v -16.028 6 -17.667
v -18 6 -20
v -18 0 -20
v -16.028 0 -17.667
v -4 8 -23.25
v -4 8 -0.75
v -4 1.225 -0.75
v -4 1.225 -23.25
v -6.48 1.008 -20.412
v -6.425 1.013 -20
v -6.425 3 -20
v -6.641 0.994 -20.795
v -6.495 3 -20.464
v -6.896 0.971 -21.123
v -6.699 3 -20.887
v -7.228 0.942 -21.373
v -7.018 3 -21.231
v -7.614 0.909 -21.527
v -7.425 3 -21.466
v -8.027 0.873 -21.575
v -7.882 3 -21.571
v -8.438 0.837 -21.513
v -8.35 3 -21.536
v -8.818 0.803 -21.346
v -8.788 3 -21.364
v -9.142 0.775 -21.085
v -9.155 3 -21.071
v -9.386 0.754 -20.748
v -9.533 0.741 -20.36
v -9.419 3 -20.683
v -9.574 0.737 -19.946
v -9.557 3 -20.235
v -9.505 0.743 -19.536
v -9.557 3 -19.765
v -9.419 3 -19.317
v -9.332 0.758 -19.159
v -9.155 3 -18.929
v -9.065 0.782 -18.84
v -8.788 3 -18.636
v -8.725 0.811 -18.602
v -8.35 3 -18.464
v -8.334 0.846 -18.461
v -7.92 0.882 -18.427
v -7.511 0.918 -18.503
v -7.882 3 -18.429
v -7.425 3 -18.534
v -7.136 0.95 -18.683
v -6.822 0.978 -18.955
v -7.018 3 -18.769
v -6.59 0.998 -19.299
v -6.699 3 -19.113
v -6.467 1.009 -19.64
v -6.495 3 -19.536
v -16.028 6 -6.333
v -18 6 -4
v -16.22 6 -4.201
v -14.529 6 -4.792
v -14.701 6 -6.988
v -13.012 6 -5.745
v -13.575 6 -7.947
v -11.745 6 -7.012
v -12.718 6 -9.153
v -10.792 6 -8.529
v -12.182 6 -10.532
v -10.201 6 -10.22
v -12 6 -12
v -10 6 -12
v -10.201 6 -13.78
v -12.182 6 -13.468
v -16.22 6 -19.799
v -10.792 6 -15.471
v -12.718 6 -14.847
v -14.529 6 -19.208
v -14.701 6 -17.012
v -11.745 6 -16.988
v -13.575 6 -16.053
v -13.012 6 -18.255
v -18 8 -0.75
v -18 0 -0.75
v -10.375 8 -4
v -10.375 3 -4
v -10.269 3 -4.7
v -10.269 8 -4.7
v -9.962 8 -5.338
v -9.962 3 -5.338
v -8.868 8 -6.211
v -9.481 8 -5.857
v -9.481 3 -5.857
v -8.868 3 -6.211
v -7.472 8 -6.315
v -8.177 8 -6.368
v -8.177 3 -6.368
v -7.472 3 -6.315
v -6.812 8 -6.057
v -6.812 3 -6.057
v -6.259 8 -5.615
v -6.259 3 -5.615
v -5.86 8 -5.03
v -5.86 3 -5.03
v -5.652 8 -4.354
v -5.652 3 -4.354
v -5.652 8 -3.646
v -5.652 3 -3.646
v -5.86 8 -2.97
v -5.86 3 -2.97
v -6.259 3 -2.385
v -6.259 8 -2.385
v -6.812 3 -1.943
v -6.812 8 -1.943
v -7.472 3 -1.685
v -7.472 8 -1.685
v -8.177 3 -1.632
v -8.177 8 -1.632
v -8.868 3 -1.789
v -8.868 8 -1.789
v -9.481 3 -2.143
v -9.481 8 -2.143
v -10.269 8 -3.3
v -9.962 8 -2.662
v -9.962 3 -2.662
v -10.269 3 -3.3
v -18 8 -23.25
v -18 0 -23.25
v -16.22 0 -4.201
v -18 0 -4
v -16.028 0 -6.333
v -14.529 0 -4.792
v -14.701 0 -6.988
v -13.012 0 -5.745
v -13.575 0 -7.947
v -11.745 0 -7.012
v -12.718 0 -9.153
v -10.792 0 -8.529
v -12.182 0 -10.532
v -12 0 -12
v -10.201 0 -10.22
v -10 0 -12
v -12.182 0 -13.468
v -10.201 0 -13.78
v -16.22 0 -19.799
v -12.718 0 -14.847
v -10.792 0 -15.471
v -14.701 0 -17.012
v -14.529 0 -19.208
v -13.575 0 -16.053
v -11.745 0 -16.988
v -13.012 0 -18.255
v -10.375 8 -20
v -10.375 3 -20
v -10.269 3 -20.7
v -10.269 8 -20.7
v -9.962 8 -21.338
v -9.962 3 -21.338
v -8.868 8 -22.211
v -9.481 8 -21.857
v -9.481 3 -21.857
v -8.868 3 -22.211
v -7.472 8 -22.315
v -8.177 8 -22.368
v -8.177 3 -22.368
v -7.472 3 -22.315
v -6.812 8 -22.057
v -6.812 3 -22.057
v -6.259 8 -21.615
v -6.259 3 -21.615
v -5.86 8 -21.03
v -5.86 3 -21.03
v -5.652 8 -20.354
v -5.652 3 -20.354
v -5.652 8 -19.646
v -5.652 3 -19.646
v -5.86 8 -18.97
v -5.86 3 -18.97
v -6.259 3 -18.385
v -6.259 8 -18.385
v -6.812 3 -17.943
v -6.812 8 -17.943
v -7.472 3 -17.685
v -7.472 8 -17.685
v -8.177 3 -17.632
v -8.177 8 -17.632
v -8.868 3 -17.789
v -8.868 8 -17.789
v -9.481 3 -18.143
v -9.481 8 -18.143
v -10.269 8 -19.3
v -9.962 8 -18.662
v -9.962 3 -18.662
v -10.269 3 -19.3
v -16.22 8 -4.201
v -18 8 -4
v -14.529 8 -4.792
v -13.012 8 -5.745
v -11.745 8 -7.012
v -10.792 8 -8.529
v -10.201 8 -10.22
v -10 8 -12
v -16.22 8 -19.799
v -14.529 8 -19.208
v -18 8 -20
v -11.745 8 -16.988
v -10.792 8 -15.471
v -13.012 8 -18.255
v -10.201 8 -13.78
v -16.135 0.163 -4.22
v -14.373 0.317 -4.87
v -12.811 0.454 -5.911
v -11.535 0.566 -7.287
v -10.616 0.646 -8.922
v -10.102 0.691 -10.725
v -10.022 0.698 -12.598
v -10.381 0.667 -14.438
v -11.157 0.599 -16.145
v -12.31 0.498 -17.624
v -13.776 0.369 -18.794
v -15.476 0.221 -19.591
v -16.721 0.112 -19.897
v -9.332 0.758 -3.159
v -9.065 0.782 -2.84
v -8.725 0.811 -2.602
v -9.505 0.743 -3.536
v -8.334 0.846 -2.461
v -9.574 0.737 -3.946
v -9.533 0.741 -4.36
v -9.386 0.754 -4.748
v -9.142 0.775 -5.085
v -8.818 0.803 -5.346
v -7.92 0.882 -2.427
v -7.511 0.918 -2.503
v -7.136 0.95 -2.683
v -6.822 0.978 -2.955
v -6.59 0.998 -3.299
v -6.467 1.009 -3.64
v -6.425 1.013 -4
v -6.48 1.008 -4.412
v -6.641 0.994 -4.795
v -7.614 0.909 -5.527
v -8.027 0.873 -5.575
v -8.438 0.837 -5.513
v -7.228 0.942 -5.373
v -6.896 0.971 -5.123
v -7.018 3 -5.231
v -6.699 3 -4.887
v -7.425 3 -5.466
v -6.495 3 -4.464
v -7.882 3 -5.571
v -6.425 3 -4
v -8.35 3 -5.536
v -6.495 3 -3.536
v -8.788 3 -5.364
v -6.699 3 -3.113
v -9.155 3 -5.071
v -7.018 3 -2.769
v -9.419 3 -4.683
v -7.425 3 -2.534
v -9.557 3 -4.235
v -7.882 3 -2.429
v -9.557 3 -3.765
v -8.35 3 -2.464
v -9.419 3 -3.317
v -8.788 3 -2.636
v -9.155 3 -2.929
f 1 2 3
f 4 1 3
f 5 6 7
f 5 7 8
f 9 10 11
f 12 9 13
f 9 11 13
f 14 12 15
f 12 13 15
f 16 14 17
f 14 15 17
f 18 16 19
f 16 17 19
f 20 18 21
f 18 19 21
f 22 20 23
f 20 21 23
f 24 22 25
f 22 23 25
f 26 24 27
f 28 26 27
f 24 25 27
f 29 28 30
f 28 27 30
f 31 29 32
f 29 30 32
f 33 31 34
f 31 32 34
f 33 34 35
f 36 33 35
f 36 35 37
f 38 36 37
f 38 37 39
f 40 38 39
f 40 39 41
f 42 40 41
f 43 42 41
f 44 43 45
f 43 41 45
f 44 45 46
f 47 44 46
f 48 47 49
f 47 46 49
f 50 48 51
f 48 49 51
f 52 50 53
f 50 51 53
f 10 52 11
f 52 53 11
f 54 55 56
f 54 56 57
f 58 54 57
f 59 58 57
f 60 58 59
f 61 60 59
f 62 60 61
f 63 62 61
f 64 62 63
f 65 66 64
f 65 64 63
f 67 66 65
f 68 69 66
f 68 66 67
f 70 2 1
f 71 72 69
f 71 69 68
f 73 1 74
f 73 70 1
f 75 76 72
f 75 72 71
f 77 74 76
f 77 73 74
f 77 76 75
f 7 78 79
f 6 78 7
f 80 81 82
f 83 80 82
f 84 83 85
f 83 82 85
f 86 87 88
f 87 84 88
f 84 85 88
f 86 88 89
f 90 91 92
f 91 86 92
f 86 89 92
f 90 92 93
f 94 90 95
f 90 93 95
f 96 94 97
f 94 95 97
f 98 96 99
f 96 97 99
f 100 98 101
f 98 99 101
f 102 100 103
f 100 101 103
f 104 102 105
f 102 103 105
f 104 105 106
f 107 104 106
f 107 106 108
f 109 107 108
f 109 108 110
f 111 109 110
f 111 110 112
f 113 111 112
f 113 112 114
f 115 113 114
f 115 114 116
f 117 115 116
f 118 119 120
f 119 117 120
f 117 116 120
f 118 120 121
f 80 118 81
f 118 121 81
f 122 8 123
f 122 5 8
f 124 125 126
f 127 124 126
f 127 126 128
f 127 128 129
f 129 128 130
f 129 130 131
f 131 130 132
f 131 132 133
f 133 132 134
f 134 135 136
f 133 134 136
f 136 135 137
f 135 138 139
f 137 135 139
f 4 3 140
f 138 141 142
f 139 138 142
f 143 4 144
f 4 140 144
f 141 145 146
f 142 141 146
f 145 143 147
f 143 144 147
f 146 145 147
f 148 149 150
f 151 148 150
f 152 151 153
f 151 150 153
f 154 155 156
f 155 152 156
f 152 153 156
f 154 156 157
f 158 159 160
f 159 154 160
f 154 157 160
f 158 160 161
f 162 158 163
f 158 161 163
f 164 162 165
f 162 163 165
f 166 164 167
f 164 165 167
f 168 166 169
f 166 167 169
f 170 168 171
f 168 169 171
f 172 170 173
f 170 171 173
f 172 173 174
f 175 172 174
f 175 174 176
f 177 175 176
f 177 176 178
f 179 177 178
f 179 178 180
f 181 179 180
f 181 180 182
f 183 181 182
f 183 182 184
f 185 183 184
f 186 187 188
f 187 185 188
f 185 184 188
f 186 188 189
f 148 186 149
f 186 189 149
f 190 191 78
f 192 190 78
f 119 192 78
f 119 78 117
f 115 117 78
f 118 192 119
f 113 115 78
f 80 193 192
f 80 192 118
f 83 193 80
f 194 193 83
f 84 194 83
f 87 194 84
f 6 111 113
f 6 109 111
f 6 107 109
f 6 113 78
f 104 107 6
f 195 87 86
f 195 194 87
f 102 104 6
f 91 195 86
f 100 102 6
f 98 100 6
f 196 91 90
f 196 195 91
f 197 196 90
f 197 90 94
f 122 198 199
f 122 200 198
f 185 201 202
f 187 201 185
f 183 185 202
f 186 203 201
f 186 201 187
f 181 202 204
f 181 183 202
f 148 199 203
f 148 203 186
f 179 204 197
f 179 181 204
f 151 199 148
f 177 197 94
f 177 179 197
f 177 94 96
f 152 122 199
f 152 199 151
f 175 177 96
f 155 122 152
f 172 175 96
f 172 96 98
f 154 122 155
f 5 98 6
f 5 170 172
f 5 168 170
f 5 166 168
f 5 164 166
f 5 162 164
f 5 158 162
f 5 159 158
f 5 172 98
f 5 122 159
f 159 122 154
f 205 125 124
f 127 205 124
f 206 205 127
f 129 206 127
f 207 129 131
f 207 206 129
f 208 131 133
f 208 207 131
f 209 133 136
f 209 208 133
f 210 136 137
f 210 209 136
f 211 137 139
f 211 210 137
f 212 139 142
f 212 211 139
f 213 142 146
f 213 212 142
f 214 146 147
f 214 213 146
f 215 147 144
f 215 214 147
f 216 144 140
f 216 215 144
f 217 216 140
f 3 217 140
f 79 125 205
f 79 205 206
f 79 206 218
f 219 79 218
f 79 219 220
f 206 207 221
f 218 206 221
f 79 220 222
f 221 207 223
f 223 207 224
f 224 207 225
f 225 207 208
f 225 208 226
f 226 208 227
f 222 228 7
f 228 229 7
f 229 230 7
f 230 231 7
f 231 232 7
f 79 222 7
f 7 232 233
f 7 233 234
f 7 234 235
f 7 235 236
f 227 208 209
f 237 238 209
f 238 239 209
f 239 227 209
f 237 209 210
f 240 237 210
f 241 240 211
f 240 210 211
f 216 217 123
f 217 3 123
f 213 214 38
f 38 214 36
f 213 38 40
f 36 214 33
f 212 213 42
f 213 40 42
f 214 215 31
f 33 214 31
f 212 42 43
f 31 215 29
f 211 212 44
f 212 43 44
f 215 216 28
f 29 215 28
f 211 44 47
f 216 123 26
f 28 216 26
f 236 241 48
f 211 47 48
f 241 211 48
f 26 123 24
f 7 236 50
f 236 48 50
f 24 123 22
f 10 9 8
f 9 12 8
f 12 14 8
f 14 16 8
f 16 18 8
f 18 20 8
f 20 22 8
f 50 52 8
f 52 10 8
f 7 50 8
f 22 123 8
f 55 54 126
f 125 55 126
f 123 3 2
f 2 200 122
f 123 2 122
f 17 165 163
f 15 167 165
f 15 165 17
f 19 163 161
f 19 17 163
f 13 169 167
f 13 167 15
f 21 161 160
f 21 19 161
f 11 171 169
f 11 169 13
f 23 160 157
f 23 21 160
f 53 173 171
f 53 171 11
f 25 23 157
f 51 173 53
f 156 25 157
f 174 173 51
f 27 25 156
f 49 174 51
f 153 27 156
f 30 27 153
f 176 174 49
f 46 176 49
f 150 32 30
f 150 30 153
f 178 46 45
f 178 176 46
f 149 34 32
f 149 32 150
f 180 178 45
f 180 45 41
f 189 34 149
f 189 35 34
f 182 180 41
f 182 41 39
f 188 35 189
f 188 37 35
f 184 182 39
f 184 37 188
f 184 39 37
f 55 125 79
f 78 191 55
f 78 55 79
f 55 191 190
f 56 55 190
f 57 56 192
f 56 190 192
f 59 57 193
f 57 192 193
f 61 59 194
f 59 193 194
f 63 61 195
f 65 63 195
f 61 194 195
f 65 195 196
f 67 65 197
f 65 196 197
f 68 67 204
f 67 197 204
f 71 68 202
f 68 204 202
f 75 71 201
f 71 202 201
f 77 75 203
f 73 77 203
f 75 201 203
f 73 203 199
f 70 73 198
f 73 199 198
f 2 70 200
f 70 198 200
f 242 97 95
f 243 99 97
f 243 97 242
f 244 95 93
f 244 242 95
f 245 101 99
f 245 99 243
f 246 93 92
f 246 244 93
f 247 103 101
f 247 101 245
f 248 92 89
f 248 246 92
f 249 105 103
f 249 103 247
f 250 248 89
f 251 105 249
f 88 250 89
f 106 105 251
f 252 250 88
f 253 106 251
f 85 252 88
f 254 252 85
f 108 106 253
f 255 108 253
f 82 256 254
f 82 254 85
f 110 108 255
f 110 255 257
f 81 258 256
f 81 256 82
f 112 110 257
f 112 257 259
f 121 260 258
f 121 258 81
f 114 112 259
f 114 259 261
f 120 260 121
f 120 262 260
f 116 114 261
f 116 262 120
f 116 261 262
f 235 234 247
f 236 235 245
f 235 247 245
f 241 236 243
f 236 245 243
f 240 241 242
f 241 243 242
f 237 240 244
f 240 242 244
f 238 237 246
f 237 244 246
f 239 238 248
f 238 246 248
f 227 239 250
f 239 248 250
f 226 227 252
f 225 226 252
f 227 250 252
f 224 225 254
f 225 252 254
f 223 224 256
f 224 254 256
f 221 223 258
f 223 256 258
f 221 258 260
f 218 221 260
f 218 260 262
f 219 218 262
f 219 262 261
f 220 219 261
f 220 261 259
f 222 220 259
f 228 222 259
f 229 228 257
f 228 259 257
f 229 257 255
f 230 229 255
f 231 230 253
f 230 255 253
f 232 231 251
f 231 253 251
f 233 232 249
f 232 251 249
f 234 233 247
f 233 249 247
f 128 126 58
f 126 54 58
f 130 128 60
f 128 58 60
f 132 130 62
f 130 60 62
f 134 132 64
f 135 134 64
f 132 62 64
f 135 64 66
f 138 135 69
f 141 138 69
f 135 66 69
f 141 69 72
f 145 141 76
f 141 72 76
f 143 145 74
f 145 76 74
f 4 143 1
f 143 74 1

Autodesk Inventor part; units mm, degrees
ref_plane "YZ Plane" through (0, 0, 0) normal (1, 0, 0) x (0, 1, 0)
ref_plane "XZ Plane" through (0, 0, 0) normal (0, 1, 0) x (-1, 0, 0)
ref_plane "XY Plane" through (0, 0, 0) normal (0, 0, 1) x (1, 0, 0)
sketch "Sketch1" plane through (0, 0, 0) normal (0, 1, 0) x (-1, 0, 0)
  arc A0 (6, -2.425) -> (6, -5.575) centre (6, -4) ccw construction
  line L0 (6, -2.425) -> (8, -2.425) construction
  arc A1 (8, -5.575) -> (8, -2.425) centre (8, -4) ccw construction
  line L1 (8, -5.575) -> (6, -5.575) construction
  arc A2 (6, -18.425) -> (6, -21.575) centre (6, -20) ccw construction
  line L2 (6, -18.425) -> (8, -18.425) construction
  arc A3 (8, -21.575) -> (8, -18.425) centre (8, -20) ccw construction
  line L3 (8, -21.575) -> (6, -21.575) construction
  line L4 (18, 0) -> (18, -4)
  line L5 (2, 0) -> (18, 0)
  line L6 (2, -24) -> (2, 0)
  line L7 (18, -24) -> (2, -24)
  line L8 (18, -20) -> (18, -24)
  arc A4 (18, -6) -> (18, -18) centre (18, -12) ccw
  line L9 (18, -6) -> (18, -4)
  line L10 (18, -20) -> (18, -18)
  arc A5 (18, -4) -> (18, -20) centre (18, -12) ccw
  circle A6 centre (8, -20) radius 2.375
  circle A7 centre (8, -4) radius 2.375
  point P0 (0, 0)
  point P1 (0, 0)
  dimension "d0" = 16
  dimension "d2" = 8
  dimension "d4" = 6
  dimension "d5" = 1.575
  dimension "d6" = 2
  dimension "d7" = 1.575
  dimension "d8" = 2
  dimension "d11" = 4.75
  dimension "d12" = 4.75
extrude "Extrusion1" add sketch "Sketch1" along normal blind 8 contours L4 A5 L8 L7 L6 L5
extrude "Extrusion3" add sketch "Sketch1" along normal blind 3 contours A6 | A7
sketch "Sketch2" plane through (-8, 3, -4) normal (0, 1, 0) x (1, 0, 0)
  circle A0 centre (0, 0) radius 2.375 projected
  circle A1 centre (0, 16) radius 2.375 projected
  circle A2 centre (0, 0) radius 2.375 projected
  circle A3 centre (0, 0) radius 1.575
  circle A4 centre (0, 16) radius 1.575
  point P0 (8, -4)
  dimension "d19" = 3.15
  dimension "d20" = 3.15
extrude "Extrusion4" cut sketch "Sketch2" against normal through all contours A3 | A4
extrude "Extrusion2" [suppressed]
sketch "Sketch3" plane through (-18, 0, 0) normal (0, 0, 1) x (1, 0, 0)
  line L0 (0, 0) -> (16, 0) projected
  line L1 (16, 0) -> (16, 8) projected
  line L2 (0, 8) -> (16, 8) projected
  line L3 (0, 0) -> (0, 8) projected
  line L4 (8.425, 3) -> (8.425, 0) projected
  line L5 (16, 0) -> (0, 0) projected
  line L6 (0, 0) -> (0, 8) projected
  line L7 (16, 8) -> (0, 8) projected
  line L8 (16, 0) -> (16, 8) projected
  point P0 (18, 0)
sketch "Sketch4" plane through (-2, 0, -24) normal (0, 0, -1) x (-1, 0, 0)
  line L0 (0, 0) -> (16, 0) projected
  line L1 (16, 0) -> (16, 8) projected
  line L2 (0, 8) -> (16, 8) projected
  line L3 (0, 0) -> (0, 8) projected
  point P0 (-2, 0)
extrude "Extrusion6" cut sketch "Sketch3" against normal blind 0.25
extrude "Extrusion7" cut sketch "Sketch4" against normal blind 0.25
sketch "Sketch5" plane through (-2, 0, -0.25) normal (1, 0, 0) x (0, 0, -1)
  line L0 (23.5, 0) -> (23.5, 8) projected
  line L1 (0, 8) -> (23.5, 8) projected
  line L2 (0, 8) -> (0, 0) projected
  line L3 (0, 0) -> (23.5, 0) projected
  point P0 (-0.25, 0)
extrude "Extrusion8" cut sketch "Sketch5" against normal blind 2
chamfer "Chamfer1" [suppressed]
chamfer "Chamfer2" [suppressed]
sketch "Sketch11" plane through (-2, 0, -23.75) normal (0, 0, -1) x (-1, 0, 0)
  line L0 (2, 8) -> (2, 0) projected
  line L1 (16, 0) -> (2, 0) projected
  line L2 (16, 8) -> (16, 0) projected
  line L3 (2, 8) -> (16, 8) projected
  line L4 (2, 0) -> (16, 0) projected
  line L5 (16, 0) -> (2, 1.2248)
  line L6 (2, 0) -> (2, 8) projected
  line L7 (16, 0) -> (30.0535, 0) construction
  point P0 (-2, 0)
  dimension "d46" = 175
extrude "Extrusion11" cut sketch "Sketch11" against normal through all contours L5 L1 L0
sketch "Sketch12" plane through (-2, 0, -23.75) normal (0, 0, -1) x (-1, 0, 0)
  line L0 (2, 1.2248) -> (16, 0) projected
  line L1 (16, 8) -> (16, 0) projected
  line L2 (2, 8) -> (16, 8) projected
  line L3 (2, 8) -> (2, 1.2248) projected
  line L4 (16, 0) -> (2, 1.2248) projected
  line L5 (2, 1.2248) -> (2, 8) projected
  line L6 (16, 8) -> (2, 8) projected
  line L7 (16, 0) -> (16, 8) projected
  point P0 (-2, 0)
extrude "Extrusion12" cut sketch "Sketch12" against normal blind 0.5
sketch "Sketch13" plane through (-18, 0, -0.25) normal (0, 0, 1) x (1, 0, 0)
  line L0 (0, 0) -> (14, 1.2248) projected
  line L1 (14, 1.2248) -> (14, 8) projected
  line L2 (0, 8) -> (14, 8) projected
  line L3 (0, 0) -> (0, 8) projected
  point P0 (18, 0)
extrude "Extrusion13" cut sketch "Sketch13" against normal blind 0.5
sketch "Sketch15" plane through (0, 8, 0) normal (0, 1, 0) x (1, 0, 0)
  arc A0 (-18, 4) -> (-18, 20) centre (-18, 12) ccw projected
  arc A1 (-18, 6) -> (-18, 18) centre (-18, 12) ccw
  line L0 (-18, 18) -> (-18, 20)
  line L1 (-18, 4) -> (-18, 0.75) projected
  line L2 (-18, 6) -> (-18, 4)
  point P0 (0, 0)
  dimension "d53" = 12
extrude "Extrusion14" add sketch "Sketch15" against normal blind 8
sketch "Sketch16" plane through (0, 8, 0) normal (0, 1, 0) x (1, 0, 0)
  arc A0 (-18, 4) -> (-18, 20) centre (-18, 12) ccw projected
  arc A1 (-18, 6) -> (-18, 18) centre (-18, 12) ccw projected
  line L0 (-18, 0.75) -> (-18, 6) projected
  line L1 (-18, 23.25) -> (-18, 18) projected
  point P0 (0, 0)
extrude "Extrusion15" cut sketch "Sketch16" against normal blind 2
chamfer "Chamfer3" distance 2 angle 45 2 edges at (-18, 3, -6) (-18, 3, -18)
equation "\"d12\" = d11"
properties part number "hotend_holder_clamp" material "ABS Plastic"
